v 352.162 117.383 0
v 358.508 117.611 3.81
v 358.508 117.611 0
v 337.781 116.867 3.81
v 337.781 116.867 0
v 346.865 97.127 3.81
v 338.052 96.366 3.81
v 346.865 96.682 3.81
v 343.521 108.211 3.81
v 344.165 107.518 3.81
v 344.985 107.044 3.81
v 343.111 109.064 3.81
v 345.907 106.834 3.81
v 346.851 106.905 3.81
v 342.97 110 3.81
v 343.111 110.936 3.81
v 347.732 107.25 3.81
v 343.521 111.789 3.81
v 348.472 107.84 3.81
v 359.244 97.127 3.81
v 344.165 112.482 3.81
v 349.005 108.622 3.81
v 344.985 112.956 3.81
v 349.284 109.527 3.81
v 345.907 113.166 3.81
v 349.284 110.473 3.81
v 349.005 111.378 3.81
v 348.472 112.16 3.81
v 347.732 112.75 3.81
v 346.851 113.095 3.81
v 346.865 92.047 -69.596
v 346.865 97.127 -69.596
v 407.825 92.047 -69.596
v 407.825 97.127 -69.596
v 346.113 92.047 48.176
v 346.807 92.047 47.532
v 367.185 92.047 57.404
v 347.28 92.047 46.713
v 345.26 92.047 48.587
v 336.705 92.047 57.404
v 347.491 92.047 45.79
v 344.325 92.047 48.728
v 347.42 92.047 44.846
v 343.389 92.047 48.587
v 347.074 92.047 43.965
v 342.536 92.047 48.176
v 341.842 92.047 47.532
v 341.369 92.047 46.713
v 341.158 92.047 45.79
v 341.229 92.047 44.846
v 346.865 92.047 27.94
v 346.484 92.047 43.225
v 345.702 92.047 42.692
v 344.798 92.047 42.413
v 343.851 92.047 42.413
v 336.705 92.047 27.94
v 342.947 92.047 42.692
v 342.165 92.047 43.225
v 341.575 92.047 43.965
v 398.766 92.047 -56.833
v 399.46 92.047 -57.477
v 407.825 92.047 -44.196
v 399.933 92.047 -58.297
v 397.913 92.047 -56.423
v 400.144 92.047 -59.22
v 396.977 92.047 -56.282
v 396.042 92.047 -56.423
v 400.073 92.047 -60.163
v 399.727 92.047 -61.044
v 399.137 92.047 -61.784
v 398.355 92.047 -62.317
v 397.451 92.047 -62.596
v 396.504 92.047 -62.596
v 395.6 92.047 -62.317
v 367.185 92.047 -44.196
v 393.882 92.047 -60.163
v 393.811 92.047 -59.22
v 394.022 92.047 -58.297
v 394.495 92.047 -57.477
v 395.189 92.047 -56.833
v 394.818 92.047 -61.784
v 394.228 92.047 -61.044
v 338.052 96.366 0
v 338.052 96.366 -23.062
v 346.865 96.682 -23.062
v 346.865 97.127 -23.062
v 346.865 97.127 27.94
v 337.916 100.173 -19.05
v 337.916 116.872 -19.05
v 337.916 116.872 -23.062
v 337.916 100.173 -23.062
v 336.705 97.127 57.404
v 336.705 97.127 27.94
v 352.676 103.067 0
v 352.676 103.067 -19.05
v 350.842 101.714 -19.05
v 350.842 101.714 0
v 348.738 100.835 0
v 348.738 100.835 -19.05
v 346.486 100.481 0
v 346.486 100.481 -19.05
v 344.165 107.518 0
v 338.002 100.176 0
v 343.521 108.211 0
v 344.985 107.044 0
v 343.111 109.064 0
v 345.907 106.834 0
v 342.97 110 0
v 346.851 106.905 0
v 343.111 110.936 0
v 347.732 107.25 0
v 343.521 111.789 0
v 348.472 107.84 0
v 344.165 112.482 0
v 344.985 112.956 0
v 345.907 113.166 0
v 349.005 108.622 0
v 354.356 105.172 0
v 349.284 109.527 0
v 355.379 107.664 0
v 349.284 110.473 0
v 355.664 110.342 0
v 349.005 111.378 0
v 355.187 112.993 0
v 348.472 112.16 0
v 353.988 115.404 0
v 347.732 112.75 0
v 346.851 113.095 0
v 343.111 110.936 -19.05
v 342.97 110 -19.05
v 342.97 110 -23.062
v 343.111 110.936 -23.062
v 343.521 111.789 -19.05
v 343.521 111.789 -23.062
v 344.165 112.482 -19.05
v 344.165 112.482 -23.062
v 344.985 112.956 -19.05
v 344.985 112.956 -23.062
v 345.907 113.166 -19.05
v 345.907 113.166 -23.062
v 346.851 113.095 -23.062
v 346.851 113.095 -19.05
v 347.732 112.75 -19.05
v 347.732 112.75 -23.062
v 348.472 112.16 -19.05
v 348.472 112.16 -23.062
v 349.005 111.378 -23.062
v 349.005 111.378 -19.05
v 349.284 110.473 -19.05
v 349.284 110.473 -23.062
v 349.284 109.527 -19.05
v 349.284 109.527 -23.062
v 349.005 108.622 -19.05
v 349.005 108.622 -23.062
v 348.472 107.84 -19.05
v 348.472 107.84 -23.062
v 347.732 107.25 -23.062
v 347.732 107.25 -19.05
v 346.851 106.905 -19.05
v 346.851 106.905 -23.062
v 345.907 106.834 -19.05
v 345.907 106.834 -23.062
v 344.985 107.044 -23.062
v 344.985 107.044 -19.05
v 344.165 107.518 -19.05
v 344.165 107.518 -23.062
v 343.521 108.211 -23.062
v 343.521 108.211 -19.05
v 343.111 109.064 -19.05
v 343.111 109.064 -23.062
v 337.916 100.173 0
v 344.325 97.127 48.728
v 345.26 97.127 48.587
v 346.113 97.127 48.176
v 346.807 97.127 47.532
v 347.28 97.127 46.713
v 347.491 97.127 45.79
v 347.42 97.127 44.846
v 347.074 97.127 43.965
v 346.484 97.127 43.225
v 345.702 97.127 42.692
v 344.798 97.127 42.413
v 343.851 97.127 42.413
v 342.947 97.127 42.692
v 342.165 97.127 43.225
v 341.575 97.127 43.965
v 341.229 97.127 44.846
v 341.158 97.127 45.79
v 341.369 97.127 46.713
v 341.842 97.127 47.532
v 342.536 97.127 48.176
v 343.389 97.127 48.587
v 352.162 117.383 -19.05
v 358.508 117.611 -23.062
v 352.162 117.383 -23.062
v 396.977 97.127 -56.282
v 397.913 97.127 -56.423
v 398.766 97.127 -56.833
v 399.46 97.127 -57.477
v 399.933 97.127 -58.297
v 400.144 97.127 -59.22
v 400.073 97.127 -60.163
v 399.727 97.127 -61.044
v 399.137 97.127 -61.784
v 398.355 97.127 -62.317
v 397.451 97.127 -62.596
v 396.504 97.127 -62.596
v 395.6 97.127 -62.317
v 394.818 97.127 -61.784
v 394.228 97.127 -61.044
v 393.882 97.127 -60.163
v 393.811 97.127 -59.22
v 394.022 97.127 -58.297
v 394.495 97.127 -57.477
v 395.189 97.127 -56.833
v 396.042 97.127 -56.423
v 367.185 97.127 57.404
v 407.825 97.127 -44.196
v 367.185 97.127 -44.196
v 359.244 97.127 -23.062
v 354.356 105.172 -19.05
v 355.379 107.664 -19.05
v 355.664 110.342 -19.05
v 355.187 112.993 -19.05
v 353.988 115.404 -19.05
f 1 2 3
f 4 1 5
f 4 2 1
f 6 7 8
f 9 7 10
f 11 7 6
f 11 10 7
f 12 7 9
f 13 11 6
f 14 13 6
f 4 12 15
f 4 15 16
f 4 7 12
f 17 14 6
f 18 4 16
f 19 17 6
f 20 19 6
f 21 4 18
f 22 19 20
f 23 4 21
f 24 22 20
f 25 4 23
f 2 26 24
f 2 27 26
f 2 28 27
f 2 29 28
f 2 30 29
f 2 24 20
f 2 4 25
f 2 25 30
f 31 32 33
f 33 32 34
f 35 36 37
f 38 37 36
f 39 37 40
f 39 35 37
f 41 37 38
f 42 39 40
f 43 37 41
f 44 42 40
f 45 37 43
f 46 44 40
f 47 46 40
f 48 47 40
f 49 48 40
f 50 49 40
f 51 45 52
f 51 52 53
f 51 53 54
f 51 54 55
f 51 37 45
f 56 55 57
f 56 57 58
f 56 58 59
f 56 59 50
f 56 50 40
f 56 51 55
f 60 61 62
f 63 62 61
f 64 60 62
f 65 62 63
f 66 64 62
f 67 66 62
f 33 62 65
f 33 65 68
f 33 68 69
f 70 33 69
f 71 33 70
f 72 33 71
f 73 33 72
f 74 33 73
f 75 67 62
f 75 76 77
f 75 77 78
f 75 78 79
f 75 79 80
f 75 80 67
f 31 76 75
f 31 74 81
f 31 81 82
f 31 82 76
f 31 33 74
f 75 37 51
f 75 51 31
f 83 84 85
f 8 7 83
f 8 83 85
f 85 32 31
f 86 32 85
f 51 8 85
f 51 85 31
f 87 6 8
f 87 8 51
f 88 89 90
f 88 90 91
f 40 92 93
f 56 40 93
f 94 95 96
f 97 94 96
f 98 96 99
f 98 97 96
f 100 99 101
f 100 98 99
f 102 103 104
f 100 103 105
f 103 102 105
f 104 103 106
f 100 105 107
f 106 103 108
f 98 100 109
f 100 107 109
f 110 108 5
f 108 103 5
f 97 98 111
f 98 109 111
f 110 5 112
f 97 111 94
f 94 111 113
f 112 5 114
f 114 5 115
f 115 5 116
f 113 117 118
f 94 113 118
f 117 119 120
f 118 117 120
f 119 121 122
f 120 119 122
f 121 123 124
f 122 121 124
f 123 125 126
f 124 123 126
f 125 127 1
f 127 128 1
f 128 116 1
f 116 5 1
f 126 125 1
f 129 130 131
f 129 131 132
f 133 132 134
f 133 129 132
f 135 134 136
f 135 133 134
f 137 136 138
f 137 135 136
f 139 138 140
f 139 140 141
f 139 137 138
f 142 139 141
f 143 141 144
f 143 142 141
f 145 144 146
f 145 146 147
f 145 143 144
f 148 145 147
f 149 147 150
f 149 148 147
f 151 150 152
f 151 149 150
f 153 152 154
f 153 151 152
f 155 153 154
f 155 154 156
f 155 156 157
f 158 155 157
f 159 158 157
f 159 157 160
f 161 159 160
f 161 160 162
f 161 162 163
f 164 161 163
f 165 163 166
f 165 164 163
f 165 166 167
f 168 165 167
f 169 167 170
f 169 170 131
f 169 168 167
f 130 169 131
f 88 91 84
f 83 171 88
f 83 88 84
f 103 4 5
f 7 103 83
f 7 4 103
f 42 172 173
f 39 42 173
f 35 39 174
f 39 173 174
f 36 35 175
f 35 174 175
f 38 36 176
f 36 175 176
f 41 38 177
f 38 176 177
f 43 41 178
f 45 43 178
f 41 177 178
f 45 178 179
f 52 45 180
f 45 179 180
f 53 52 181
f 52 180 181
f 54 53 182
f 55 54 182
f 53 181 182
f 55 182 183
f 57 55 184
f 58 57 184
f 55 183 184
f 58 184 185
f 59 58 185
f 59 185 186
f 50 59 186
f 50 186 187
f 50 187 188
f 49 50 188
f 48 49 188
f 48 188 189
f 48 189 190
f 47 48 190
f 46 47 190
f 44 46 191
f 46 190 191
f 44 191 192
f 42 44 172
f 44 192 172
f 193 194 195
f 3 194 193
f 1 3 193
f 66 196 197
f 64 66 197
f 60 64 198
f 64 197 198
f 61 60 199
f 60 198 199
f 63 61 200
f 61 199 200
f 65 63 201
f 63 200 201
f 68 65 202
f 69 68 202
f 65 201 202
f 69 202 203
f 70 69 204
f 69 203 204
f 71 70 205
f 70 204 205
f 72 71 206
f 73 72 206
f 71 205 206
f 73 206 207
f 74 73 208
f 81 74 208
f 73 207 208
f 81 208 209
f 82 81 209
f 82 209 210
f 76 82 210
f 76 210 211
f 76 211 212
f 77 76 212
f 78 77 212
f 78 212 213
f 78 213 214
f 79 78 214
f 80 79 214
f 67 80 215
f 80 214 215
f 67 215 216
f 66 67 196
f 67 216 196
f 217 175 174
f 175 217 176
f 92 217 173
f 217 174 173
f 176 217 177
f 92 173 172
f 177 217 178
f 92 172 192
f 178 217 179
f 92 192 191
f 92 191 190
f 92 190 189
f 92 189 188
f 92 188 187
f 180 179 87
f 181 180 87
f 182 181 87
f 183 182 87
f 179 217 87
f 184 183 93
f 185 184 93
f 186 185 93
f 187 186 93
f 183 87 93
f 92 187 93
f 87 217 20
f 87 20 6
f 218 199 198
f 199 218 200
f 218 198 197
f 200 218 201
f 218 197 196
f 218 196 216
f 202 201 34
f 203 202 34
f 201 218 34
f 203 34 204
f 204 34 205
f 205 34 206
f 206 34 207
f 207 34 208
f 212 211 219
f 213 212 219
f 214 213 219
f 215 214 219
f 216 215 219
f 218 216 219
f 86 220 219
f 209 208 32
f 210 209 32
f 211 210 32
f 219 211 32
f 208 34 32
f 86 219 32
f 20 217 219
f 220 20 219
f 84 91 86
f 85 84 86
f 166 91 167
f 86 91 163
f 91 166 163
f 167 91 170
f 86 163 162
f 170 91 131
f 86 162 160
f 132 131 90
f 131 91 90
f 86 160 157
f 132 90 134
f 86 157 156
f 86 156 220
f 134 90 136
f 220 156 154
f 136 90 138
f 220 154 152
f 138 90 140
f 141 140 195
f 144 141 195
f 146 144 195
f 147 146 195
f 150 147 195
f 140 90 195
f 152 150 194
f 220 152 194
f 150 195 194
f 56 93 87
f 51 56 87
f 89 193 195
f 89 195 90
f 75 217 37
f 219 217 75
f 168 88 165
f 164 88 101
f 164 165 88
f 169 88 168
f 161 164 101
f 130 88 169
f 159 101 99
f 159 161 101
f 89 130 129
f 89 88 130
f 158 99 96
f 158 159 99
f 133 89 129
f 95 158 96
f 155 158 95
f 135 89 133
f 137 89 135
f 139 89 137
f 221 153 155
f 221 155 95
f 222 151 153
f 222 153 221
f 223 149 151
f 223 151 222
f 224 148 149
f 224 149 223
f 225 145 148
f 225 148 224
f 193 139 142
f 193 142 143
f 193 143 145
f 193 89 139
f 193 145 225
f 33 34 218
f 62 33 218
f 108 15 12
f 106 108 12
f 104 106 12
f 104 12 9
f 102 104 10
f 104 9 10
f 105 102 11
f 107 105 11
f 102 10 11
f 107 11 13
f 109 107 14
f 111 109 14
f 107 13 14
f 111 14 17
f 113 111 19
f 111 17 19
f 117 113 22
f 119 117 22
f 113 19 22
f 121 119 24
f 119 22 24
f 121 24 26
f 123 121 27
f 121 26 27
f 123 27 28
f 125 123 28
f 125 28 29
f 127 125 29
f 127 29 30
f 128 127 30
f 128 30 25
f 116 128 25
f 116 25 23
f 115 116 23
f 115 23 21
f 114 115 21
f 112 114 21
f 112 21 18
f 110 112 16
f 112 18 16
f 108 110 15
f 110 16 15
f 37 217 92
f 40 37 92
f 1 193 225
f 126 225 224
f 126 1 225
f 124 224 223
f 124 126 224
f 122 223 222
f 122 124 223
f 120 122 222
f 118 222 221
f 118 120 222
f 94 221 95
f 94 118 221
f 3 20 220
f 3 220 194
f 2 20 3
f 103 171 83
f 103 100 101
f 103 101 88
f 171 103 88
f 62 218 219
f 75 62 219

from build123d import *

# Parameters (mm, degrees)
BOSS_EXTRUDE2_DEPTH = 23.061761584
BOSS_EXTRUDE3_START = -4.011761584
SKETCH5_R           = 3.175
BOSS_EXTRUDE3_DEPTH = 4.011761584
BOSS_EXTRUDE5_START = 3.81
SKETCH6_R           = 3.175
BOSS_EXTRUDE5_DEPTH = 3.81
SKETCH7_R           = 3.175
BOSS_EXTRUDE6_DEPTH = 5.08


with BuildPart() as part:
    # Sketch1 → Boss-Extrude2 (new body)
    with BuildSketch(Plane.XY):
        with BuildLine():
            Line((346.486451601, 100.481133449), (337.915550261, 100.173402481))
            Line((337.915550261, 100.173402481), (338.052257003, 96.365855861))
            Line((338.052257003, 96.365855861), (359.243555017, 97.126711503))
            Line((359.243555017, 97.126711503), (358.508072741, 117.611312321))
            Line((358.508072741, 117.611312321), (352.162161707, 117.383467749))
            ThreePointArc((352.162161707, 117.383467749), (355.663551295, 110.341766857), (352.67617906, 103.067092457))
            ThreePointArc((352.67617906, 103.067092457), (349.816499797, 101.211177598), (346.486451601, 100.481133449))
        make_face()
    extrude(amount=-BOSS_EXTRUDE2_DEPTH)

    # Sketch5 → Boss-Extrude3 (add)
    with BuildSketch(Plane(origin=(0, 0, -23.061761584), x_dir=(-1, 0, 0), z_dir=(0, 0, -1)).offset(BOSS_EXTRUDE3_START)):
        with BuildLine():
            Line((-337.915550261, 116.871955208), (-337.915550261, 100.173402481))
            Line((-337.915550261, 100.173402481), (-346.486451601, 100.481133449))
            ThreePointArc((-346.486451601, 100.481133449), (-355.174204205, 106.967937449), (-352.162161707, 117.383467749))
            Line((-352.162161707, 117.383467749), (-337.915550261, 116.871955208))
        make_face()
        with Locations((-346.144684744, 110)):
            Circle(SKETCH5_R, mode=Mode.SUBTRACT)
    extrude(amount=BOSS_EXTRUDE3_DEPTH)

    # Sketch6 → Boss-Extrude5 (add)
    with BuildSketch(Plane.XY.offset(BOSS_EXTRUDE5_START)):
        Polygon((337.780813741, 116.867117607), (338.052257003, 96.365855861), (359.243555017, 97.126711503), (358.508072741, 117.611312321), align=None)
        with Locations(Location((346.144684744, 110, 0), (0, 0, 180))):
            Circle(SKETCH6_R, mode=Mode.SUBTRACT)
    extrude(amount=-BOSS_EXTRUDE5_DEPTH)

    # Sketch7 → Boss-Extrude6 (add)
    with BuildSketch(Plane(origin=(0, 97.126711503, 0), x_dir=(1, 0, 0), z_dir=(0, 1, 0))):
        Polygon((367.184506183, -32.004), (367.184506183, -57.404), (336.704506183, -57.404), (336.704506183, -27.94), (346.864506183, -27.94), (346.864506183, 44.958), (346.864506183, 69.596), (407.824506183, 69.596), (407.824506183, 44.196), (367.184506183, 44.196), align=None)
        with Locations(Location((396.977487406, 59.456782771, 0), (0, 0, 270))):
            Circle(SKETCH7_R, mode=Mode.SUBTRACT)
        with Locations(Location((344.324506183, -45.552790878, 0), (0, 0, 270))):
            Circle(SKETCH7_R, mode=Mode.SUBTRACT)
    extrude(amount=-BOSS_EXTRUDE6_DEPTH)


solid = part.part
